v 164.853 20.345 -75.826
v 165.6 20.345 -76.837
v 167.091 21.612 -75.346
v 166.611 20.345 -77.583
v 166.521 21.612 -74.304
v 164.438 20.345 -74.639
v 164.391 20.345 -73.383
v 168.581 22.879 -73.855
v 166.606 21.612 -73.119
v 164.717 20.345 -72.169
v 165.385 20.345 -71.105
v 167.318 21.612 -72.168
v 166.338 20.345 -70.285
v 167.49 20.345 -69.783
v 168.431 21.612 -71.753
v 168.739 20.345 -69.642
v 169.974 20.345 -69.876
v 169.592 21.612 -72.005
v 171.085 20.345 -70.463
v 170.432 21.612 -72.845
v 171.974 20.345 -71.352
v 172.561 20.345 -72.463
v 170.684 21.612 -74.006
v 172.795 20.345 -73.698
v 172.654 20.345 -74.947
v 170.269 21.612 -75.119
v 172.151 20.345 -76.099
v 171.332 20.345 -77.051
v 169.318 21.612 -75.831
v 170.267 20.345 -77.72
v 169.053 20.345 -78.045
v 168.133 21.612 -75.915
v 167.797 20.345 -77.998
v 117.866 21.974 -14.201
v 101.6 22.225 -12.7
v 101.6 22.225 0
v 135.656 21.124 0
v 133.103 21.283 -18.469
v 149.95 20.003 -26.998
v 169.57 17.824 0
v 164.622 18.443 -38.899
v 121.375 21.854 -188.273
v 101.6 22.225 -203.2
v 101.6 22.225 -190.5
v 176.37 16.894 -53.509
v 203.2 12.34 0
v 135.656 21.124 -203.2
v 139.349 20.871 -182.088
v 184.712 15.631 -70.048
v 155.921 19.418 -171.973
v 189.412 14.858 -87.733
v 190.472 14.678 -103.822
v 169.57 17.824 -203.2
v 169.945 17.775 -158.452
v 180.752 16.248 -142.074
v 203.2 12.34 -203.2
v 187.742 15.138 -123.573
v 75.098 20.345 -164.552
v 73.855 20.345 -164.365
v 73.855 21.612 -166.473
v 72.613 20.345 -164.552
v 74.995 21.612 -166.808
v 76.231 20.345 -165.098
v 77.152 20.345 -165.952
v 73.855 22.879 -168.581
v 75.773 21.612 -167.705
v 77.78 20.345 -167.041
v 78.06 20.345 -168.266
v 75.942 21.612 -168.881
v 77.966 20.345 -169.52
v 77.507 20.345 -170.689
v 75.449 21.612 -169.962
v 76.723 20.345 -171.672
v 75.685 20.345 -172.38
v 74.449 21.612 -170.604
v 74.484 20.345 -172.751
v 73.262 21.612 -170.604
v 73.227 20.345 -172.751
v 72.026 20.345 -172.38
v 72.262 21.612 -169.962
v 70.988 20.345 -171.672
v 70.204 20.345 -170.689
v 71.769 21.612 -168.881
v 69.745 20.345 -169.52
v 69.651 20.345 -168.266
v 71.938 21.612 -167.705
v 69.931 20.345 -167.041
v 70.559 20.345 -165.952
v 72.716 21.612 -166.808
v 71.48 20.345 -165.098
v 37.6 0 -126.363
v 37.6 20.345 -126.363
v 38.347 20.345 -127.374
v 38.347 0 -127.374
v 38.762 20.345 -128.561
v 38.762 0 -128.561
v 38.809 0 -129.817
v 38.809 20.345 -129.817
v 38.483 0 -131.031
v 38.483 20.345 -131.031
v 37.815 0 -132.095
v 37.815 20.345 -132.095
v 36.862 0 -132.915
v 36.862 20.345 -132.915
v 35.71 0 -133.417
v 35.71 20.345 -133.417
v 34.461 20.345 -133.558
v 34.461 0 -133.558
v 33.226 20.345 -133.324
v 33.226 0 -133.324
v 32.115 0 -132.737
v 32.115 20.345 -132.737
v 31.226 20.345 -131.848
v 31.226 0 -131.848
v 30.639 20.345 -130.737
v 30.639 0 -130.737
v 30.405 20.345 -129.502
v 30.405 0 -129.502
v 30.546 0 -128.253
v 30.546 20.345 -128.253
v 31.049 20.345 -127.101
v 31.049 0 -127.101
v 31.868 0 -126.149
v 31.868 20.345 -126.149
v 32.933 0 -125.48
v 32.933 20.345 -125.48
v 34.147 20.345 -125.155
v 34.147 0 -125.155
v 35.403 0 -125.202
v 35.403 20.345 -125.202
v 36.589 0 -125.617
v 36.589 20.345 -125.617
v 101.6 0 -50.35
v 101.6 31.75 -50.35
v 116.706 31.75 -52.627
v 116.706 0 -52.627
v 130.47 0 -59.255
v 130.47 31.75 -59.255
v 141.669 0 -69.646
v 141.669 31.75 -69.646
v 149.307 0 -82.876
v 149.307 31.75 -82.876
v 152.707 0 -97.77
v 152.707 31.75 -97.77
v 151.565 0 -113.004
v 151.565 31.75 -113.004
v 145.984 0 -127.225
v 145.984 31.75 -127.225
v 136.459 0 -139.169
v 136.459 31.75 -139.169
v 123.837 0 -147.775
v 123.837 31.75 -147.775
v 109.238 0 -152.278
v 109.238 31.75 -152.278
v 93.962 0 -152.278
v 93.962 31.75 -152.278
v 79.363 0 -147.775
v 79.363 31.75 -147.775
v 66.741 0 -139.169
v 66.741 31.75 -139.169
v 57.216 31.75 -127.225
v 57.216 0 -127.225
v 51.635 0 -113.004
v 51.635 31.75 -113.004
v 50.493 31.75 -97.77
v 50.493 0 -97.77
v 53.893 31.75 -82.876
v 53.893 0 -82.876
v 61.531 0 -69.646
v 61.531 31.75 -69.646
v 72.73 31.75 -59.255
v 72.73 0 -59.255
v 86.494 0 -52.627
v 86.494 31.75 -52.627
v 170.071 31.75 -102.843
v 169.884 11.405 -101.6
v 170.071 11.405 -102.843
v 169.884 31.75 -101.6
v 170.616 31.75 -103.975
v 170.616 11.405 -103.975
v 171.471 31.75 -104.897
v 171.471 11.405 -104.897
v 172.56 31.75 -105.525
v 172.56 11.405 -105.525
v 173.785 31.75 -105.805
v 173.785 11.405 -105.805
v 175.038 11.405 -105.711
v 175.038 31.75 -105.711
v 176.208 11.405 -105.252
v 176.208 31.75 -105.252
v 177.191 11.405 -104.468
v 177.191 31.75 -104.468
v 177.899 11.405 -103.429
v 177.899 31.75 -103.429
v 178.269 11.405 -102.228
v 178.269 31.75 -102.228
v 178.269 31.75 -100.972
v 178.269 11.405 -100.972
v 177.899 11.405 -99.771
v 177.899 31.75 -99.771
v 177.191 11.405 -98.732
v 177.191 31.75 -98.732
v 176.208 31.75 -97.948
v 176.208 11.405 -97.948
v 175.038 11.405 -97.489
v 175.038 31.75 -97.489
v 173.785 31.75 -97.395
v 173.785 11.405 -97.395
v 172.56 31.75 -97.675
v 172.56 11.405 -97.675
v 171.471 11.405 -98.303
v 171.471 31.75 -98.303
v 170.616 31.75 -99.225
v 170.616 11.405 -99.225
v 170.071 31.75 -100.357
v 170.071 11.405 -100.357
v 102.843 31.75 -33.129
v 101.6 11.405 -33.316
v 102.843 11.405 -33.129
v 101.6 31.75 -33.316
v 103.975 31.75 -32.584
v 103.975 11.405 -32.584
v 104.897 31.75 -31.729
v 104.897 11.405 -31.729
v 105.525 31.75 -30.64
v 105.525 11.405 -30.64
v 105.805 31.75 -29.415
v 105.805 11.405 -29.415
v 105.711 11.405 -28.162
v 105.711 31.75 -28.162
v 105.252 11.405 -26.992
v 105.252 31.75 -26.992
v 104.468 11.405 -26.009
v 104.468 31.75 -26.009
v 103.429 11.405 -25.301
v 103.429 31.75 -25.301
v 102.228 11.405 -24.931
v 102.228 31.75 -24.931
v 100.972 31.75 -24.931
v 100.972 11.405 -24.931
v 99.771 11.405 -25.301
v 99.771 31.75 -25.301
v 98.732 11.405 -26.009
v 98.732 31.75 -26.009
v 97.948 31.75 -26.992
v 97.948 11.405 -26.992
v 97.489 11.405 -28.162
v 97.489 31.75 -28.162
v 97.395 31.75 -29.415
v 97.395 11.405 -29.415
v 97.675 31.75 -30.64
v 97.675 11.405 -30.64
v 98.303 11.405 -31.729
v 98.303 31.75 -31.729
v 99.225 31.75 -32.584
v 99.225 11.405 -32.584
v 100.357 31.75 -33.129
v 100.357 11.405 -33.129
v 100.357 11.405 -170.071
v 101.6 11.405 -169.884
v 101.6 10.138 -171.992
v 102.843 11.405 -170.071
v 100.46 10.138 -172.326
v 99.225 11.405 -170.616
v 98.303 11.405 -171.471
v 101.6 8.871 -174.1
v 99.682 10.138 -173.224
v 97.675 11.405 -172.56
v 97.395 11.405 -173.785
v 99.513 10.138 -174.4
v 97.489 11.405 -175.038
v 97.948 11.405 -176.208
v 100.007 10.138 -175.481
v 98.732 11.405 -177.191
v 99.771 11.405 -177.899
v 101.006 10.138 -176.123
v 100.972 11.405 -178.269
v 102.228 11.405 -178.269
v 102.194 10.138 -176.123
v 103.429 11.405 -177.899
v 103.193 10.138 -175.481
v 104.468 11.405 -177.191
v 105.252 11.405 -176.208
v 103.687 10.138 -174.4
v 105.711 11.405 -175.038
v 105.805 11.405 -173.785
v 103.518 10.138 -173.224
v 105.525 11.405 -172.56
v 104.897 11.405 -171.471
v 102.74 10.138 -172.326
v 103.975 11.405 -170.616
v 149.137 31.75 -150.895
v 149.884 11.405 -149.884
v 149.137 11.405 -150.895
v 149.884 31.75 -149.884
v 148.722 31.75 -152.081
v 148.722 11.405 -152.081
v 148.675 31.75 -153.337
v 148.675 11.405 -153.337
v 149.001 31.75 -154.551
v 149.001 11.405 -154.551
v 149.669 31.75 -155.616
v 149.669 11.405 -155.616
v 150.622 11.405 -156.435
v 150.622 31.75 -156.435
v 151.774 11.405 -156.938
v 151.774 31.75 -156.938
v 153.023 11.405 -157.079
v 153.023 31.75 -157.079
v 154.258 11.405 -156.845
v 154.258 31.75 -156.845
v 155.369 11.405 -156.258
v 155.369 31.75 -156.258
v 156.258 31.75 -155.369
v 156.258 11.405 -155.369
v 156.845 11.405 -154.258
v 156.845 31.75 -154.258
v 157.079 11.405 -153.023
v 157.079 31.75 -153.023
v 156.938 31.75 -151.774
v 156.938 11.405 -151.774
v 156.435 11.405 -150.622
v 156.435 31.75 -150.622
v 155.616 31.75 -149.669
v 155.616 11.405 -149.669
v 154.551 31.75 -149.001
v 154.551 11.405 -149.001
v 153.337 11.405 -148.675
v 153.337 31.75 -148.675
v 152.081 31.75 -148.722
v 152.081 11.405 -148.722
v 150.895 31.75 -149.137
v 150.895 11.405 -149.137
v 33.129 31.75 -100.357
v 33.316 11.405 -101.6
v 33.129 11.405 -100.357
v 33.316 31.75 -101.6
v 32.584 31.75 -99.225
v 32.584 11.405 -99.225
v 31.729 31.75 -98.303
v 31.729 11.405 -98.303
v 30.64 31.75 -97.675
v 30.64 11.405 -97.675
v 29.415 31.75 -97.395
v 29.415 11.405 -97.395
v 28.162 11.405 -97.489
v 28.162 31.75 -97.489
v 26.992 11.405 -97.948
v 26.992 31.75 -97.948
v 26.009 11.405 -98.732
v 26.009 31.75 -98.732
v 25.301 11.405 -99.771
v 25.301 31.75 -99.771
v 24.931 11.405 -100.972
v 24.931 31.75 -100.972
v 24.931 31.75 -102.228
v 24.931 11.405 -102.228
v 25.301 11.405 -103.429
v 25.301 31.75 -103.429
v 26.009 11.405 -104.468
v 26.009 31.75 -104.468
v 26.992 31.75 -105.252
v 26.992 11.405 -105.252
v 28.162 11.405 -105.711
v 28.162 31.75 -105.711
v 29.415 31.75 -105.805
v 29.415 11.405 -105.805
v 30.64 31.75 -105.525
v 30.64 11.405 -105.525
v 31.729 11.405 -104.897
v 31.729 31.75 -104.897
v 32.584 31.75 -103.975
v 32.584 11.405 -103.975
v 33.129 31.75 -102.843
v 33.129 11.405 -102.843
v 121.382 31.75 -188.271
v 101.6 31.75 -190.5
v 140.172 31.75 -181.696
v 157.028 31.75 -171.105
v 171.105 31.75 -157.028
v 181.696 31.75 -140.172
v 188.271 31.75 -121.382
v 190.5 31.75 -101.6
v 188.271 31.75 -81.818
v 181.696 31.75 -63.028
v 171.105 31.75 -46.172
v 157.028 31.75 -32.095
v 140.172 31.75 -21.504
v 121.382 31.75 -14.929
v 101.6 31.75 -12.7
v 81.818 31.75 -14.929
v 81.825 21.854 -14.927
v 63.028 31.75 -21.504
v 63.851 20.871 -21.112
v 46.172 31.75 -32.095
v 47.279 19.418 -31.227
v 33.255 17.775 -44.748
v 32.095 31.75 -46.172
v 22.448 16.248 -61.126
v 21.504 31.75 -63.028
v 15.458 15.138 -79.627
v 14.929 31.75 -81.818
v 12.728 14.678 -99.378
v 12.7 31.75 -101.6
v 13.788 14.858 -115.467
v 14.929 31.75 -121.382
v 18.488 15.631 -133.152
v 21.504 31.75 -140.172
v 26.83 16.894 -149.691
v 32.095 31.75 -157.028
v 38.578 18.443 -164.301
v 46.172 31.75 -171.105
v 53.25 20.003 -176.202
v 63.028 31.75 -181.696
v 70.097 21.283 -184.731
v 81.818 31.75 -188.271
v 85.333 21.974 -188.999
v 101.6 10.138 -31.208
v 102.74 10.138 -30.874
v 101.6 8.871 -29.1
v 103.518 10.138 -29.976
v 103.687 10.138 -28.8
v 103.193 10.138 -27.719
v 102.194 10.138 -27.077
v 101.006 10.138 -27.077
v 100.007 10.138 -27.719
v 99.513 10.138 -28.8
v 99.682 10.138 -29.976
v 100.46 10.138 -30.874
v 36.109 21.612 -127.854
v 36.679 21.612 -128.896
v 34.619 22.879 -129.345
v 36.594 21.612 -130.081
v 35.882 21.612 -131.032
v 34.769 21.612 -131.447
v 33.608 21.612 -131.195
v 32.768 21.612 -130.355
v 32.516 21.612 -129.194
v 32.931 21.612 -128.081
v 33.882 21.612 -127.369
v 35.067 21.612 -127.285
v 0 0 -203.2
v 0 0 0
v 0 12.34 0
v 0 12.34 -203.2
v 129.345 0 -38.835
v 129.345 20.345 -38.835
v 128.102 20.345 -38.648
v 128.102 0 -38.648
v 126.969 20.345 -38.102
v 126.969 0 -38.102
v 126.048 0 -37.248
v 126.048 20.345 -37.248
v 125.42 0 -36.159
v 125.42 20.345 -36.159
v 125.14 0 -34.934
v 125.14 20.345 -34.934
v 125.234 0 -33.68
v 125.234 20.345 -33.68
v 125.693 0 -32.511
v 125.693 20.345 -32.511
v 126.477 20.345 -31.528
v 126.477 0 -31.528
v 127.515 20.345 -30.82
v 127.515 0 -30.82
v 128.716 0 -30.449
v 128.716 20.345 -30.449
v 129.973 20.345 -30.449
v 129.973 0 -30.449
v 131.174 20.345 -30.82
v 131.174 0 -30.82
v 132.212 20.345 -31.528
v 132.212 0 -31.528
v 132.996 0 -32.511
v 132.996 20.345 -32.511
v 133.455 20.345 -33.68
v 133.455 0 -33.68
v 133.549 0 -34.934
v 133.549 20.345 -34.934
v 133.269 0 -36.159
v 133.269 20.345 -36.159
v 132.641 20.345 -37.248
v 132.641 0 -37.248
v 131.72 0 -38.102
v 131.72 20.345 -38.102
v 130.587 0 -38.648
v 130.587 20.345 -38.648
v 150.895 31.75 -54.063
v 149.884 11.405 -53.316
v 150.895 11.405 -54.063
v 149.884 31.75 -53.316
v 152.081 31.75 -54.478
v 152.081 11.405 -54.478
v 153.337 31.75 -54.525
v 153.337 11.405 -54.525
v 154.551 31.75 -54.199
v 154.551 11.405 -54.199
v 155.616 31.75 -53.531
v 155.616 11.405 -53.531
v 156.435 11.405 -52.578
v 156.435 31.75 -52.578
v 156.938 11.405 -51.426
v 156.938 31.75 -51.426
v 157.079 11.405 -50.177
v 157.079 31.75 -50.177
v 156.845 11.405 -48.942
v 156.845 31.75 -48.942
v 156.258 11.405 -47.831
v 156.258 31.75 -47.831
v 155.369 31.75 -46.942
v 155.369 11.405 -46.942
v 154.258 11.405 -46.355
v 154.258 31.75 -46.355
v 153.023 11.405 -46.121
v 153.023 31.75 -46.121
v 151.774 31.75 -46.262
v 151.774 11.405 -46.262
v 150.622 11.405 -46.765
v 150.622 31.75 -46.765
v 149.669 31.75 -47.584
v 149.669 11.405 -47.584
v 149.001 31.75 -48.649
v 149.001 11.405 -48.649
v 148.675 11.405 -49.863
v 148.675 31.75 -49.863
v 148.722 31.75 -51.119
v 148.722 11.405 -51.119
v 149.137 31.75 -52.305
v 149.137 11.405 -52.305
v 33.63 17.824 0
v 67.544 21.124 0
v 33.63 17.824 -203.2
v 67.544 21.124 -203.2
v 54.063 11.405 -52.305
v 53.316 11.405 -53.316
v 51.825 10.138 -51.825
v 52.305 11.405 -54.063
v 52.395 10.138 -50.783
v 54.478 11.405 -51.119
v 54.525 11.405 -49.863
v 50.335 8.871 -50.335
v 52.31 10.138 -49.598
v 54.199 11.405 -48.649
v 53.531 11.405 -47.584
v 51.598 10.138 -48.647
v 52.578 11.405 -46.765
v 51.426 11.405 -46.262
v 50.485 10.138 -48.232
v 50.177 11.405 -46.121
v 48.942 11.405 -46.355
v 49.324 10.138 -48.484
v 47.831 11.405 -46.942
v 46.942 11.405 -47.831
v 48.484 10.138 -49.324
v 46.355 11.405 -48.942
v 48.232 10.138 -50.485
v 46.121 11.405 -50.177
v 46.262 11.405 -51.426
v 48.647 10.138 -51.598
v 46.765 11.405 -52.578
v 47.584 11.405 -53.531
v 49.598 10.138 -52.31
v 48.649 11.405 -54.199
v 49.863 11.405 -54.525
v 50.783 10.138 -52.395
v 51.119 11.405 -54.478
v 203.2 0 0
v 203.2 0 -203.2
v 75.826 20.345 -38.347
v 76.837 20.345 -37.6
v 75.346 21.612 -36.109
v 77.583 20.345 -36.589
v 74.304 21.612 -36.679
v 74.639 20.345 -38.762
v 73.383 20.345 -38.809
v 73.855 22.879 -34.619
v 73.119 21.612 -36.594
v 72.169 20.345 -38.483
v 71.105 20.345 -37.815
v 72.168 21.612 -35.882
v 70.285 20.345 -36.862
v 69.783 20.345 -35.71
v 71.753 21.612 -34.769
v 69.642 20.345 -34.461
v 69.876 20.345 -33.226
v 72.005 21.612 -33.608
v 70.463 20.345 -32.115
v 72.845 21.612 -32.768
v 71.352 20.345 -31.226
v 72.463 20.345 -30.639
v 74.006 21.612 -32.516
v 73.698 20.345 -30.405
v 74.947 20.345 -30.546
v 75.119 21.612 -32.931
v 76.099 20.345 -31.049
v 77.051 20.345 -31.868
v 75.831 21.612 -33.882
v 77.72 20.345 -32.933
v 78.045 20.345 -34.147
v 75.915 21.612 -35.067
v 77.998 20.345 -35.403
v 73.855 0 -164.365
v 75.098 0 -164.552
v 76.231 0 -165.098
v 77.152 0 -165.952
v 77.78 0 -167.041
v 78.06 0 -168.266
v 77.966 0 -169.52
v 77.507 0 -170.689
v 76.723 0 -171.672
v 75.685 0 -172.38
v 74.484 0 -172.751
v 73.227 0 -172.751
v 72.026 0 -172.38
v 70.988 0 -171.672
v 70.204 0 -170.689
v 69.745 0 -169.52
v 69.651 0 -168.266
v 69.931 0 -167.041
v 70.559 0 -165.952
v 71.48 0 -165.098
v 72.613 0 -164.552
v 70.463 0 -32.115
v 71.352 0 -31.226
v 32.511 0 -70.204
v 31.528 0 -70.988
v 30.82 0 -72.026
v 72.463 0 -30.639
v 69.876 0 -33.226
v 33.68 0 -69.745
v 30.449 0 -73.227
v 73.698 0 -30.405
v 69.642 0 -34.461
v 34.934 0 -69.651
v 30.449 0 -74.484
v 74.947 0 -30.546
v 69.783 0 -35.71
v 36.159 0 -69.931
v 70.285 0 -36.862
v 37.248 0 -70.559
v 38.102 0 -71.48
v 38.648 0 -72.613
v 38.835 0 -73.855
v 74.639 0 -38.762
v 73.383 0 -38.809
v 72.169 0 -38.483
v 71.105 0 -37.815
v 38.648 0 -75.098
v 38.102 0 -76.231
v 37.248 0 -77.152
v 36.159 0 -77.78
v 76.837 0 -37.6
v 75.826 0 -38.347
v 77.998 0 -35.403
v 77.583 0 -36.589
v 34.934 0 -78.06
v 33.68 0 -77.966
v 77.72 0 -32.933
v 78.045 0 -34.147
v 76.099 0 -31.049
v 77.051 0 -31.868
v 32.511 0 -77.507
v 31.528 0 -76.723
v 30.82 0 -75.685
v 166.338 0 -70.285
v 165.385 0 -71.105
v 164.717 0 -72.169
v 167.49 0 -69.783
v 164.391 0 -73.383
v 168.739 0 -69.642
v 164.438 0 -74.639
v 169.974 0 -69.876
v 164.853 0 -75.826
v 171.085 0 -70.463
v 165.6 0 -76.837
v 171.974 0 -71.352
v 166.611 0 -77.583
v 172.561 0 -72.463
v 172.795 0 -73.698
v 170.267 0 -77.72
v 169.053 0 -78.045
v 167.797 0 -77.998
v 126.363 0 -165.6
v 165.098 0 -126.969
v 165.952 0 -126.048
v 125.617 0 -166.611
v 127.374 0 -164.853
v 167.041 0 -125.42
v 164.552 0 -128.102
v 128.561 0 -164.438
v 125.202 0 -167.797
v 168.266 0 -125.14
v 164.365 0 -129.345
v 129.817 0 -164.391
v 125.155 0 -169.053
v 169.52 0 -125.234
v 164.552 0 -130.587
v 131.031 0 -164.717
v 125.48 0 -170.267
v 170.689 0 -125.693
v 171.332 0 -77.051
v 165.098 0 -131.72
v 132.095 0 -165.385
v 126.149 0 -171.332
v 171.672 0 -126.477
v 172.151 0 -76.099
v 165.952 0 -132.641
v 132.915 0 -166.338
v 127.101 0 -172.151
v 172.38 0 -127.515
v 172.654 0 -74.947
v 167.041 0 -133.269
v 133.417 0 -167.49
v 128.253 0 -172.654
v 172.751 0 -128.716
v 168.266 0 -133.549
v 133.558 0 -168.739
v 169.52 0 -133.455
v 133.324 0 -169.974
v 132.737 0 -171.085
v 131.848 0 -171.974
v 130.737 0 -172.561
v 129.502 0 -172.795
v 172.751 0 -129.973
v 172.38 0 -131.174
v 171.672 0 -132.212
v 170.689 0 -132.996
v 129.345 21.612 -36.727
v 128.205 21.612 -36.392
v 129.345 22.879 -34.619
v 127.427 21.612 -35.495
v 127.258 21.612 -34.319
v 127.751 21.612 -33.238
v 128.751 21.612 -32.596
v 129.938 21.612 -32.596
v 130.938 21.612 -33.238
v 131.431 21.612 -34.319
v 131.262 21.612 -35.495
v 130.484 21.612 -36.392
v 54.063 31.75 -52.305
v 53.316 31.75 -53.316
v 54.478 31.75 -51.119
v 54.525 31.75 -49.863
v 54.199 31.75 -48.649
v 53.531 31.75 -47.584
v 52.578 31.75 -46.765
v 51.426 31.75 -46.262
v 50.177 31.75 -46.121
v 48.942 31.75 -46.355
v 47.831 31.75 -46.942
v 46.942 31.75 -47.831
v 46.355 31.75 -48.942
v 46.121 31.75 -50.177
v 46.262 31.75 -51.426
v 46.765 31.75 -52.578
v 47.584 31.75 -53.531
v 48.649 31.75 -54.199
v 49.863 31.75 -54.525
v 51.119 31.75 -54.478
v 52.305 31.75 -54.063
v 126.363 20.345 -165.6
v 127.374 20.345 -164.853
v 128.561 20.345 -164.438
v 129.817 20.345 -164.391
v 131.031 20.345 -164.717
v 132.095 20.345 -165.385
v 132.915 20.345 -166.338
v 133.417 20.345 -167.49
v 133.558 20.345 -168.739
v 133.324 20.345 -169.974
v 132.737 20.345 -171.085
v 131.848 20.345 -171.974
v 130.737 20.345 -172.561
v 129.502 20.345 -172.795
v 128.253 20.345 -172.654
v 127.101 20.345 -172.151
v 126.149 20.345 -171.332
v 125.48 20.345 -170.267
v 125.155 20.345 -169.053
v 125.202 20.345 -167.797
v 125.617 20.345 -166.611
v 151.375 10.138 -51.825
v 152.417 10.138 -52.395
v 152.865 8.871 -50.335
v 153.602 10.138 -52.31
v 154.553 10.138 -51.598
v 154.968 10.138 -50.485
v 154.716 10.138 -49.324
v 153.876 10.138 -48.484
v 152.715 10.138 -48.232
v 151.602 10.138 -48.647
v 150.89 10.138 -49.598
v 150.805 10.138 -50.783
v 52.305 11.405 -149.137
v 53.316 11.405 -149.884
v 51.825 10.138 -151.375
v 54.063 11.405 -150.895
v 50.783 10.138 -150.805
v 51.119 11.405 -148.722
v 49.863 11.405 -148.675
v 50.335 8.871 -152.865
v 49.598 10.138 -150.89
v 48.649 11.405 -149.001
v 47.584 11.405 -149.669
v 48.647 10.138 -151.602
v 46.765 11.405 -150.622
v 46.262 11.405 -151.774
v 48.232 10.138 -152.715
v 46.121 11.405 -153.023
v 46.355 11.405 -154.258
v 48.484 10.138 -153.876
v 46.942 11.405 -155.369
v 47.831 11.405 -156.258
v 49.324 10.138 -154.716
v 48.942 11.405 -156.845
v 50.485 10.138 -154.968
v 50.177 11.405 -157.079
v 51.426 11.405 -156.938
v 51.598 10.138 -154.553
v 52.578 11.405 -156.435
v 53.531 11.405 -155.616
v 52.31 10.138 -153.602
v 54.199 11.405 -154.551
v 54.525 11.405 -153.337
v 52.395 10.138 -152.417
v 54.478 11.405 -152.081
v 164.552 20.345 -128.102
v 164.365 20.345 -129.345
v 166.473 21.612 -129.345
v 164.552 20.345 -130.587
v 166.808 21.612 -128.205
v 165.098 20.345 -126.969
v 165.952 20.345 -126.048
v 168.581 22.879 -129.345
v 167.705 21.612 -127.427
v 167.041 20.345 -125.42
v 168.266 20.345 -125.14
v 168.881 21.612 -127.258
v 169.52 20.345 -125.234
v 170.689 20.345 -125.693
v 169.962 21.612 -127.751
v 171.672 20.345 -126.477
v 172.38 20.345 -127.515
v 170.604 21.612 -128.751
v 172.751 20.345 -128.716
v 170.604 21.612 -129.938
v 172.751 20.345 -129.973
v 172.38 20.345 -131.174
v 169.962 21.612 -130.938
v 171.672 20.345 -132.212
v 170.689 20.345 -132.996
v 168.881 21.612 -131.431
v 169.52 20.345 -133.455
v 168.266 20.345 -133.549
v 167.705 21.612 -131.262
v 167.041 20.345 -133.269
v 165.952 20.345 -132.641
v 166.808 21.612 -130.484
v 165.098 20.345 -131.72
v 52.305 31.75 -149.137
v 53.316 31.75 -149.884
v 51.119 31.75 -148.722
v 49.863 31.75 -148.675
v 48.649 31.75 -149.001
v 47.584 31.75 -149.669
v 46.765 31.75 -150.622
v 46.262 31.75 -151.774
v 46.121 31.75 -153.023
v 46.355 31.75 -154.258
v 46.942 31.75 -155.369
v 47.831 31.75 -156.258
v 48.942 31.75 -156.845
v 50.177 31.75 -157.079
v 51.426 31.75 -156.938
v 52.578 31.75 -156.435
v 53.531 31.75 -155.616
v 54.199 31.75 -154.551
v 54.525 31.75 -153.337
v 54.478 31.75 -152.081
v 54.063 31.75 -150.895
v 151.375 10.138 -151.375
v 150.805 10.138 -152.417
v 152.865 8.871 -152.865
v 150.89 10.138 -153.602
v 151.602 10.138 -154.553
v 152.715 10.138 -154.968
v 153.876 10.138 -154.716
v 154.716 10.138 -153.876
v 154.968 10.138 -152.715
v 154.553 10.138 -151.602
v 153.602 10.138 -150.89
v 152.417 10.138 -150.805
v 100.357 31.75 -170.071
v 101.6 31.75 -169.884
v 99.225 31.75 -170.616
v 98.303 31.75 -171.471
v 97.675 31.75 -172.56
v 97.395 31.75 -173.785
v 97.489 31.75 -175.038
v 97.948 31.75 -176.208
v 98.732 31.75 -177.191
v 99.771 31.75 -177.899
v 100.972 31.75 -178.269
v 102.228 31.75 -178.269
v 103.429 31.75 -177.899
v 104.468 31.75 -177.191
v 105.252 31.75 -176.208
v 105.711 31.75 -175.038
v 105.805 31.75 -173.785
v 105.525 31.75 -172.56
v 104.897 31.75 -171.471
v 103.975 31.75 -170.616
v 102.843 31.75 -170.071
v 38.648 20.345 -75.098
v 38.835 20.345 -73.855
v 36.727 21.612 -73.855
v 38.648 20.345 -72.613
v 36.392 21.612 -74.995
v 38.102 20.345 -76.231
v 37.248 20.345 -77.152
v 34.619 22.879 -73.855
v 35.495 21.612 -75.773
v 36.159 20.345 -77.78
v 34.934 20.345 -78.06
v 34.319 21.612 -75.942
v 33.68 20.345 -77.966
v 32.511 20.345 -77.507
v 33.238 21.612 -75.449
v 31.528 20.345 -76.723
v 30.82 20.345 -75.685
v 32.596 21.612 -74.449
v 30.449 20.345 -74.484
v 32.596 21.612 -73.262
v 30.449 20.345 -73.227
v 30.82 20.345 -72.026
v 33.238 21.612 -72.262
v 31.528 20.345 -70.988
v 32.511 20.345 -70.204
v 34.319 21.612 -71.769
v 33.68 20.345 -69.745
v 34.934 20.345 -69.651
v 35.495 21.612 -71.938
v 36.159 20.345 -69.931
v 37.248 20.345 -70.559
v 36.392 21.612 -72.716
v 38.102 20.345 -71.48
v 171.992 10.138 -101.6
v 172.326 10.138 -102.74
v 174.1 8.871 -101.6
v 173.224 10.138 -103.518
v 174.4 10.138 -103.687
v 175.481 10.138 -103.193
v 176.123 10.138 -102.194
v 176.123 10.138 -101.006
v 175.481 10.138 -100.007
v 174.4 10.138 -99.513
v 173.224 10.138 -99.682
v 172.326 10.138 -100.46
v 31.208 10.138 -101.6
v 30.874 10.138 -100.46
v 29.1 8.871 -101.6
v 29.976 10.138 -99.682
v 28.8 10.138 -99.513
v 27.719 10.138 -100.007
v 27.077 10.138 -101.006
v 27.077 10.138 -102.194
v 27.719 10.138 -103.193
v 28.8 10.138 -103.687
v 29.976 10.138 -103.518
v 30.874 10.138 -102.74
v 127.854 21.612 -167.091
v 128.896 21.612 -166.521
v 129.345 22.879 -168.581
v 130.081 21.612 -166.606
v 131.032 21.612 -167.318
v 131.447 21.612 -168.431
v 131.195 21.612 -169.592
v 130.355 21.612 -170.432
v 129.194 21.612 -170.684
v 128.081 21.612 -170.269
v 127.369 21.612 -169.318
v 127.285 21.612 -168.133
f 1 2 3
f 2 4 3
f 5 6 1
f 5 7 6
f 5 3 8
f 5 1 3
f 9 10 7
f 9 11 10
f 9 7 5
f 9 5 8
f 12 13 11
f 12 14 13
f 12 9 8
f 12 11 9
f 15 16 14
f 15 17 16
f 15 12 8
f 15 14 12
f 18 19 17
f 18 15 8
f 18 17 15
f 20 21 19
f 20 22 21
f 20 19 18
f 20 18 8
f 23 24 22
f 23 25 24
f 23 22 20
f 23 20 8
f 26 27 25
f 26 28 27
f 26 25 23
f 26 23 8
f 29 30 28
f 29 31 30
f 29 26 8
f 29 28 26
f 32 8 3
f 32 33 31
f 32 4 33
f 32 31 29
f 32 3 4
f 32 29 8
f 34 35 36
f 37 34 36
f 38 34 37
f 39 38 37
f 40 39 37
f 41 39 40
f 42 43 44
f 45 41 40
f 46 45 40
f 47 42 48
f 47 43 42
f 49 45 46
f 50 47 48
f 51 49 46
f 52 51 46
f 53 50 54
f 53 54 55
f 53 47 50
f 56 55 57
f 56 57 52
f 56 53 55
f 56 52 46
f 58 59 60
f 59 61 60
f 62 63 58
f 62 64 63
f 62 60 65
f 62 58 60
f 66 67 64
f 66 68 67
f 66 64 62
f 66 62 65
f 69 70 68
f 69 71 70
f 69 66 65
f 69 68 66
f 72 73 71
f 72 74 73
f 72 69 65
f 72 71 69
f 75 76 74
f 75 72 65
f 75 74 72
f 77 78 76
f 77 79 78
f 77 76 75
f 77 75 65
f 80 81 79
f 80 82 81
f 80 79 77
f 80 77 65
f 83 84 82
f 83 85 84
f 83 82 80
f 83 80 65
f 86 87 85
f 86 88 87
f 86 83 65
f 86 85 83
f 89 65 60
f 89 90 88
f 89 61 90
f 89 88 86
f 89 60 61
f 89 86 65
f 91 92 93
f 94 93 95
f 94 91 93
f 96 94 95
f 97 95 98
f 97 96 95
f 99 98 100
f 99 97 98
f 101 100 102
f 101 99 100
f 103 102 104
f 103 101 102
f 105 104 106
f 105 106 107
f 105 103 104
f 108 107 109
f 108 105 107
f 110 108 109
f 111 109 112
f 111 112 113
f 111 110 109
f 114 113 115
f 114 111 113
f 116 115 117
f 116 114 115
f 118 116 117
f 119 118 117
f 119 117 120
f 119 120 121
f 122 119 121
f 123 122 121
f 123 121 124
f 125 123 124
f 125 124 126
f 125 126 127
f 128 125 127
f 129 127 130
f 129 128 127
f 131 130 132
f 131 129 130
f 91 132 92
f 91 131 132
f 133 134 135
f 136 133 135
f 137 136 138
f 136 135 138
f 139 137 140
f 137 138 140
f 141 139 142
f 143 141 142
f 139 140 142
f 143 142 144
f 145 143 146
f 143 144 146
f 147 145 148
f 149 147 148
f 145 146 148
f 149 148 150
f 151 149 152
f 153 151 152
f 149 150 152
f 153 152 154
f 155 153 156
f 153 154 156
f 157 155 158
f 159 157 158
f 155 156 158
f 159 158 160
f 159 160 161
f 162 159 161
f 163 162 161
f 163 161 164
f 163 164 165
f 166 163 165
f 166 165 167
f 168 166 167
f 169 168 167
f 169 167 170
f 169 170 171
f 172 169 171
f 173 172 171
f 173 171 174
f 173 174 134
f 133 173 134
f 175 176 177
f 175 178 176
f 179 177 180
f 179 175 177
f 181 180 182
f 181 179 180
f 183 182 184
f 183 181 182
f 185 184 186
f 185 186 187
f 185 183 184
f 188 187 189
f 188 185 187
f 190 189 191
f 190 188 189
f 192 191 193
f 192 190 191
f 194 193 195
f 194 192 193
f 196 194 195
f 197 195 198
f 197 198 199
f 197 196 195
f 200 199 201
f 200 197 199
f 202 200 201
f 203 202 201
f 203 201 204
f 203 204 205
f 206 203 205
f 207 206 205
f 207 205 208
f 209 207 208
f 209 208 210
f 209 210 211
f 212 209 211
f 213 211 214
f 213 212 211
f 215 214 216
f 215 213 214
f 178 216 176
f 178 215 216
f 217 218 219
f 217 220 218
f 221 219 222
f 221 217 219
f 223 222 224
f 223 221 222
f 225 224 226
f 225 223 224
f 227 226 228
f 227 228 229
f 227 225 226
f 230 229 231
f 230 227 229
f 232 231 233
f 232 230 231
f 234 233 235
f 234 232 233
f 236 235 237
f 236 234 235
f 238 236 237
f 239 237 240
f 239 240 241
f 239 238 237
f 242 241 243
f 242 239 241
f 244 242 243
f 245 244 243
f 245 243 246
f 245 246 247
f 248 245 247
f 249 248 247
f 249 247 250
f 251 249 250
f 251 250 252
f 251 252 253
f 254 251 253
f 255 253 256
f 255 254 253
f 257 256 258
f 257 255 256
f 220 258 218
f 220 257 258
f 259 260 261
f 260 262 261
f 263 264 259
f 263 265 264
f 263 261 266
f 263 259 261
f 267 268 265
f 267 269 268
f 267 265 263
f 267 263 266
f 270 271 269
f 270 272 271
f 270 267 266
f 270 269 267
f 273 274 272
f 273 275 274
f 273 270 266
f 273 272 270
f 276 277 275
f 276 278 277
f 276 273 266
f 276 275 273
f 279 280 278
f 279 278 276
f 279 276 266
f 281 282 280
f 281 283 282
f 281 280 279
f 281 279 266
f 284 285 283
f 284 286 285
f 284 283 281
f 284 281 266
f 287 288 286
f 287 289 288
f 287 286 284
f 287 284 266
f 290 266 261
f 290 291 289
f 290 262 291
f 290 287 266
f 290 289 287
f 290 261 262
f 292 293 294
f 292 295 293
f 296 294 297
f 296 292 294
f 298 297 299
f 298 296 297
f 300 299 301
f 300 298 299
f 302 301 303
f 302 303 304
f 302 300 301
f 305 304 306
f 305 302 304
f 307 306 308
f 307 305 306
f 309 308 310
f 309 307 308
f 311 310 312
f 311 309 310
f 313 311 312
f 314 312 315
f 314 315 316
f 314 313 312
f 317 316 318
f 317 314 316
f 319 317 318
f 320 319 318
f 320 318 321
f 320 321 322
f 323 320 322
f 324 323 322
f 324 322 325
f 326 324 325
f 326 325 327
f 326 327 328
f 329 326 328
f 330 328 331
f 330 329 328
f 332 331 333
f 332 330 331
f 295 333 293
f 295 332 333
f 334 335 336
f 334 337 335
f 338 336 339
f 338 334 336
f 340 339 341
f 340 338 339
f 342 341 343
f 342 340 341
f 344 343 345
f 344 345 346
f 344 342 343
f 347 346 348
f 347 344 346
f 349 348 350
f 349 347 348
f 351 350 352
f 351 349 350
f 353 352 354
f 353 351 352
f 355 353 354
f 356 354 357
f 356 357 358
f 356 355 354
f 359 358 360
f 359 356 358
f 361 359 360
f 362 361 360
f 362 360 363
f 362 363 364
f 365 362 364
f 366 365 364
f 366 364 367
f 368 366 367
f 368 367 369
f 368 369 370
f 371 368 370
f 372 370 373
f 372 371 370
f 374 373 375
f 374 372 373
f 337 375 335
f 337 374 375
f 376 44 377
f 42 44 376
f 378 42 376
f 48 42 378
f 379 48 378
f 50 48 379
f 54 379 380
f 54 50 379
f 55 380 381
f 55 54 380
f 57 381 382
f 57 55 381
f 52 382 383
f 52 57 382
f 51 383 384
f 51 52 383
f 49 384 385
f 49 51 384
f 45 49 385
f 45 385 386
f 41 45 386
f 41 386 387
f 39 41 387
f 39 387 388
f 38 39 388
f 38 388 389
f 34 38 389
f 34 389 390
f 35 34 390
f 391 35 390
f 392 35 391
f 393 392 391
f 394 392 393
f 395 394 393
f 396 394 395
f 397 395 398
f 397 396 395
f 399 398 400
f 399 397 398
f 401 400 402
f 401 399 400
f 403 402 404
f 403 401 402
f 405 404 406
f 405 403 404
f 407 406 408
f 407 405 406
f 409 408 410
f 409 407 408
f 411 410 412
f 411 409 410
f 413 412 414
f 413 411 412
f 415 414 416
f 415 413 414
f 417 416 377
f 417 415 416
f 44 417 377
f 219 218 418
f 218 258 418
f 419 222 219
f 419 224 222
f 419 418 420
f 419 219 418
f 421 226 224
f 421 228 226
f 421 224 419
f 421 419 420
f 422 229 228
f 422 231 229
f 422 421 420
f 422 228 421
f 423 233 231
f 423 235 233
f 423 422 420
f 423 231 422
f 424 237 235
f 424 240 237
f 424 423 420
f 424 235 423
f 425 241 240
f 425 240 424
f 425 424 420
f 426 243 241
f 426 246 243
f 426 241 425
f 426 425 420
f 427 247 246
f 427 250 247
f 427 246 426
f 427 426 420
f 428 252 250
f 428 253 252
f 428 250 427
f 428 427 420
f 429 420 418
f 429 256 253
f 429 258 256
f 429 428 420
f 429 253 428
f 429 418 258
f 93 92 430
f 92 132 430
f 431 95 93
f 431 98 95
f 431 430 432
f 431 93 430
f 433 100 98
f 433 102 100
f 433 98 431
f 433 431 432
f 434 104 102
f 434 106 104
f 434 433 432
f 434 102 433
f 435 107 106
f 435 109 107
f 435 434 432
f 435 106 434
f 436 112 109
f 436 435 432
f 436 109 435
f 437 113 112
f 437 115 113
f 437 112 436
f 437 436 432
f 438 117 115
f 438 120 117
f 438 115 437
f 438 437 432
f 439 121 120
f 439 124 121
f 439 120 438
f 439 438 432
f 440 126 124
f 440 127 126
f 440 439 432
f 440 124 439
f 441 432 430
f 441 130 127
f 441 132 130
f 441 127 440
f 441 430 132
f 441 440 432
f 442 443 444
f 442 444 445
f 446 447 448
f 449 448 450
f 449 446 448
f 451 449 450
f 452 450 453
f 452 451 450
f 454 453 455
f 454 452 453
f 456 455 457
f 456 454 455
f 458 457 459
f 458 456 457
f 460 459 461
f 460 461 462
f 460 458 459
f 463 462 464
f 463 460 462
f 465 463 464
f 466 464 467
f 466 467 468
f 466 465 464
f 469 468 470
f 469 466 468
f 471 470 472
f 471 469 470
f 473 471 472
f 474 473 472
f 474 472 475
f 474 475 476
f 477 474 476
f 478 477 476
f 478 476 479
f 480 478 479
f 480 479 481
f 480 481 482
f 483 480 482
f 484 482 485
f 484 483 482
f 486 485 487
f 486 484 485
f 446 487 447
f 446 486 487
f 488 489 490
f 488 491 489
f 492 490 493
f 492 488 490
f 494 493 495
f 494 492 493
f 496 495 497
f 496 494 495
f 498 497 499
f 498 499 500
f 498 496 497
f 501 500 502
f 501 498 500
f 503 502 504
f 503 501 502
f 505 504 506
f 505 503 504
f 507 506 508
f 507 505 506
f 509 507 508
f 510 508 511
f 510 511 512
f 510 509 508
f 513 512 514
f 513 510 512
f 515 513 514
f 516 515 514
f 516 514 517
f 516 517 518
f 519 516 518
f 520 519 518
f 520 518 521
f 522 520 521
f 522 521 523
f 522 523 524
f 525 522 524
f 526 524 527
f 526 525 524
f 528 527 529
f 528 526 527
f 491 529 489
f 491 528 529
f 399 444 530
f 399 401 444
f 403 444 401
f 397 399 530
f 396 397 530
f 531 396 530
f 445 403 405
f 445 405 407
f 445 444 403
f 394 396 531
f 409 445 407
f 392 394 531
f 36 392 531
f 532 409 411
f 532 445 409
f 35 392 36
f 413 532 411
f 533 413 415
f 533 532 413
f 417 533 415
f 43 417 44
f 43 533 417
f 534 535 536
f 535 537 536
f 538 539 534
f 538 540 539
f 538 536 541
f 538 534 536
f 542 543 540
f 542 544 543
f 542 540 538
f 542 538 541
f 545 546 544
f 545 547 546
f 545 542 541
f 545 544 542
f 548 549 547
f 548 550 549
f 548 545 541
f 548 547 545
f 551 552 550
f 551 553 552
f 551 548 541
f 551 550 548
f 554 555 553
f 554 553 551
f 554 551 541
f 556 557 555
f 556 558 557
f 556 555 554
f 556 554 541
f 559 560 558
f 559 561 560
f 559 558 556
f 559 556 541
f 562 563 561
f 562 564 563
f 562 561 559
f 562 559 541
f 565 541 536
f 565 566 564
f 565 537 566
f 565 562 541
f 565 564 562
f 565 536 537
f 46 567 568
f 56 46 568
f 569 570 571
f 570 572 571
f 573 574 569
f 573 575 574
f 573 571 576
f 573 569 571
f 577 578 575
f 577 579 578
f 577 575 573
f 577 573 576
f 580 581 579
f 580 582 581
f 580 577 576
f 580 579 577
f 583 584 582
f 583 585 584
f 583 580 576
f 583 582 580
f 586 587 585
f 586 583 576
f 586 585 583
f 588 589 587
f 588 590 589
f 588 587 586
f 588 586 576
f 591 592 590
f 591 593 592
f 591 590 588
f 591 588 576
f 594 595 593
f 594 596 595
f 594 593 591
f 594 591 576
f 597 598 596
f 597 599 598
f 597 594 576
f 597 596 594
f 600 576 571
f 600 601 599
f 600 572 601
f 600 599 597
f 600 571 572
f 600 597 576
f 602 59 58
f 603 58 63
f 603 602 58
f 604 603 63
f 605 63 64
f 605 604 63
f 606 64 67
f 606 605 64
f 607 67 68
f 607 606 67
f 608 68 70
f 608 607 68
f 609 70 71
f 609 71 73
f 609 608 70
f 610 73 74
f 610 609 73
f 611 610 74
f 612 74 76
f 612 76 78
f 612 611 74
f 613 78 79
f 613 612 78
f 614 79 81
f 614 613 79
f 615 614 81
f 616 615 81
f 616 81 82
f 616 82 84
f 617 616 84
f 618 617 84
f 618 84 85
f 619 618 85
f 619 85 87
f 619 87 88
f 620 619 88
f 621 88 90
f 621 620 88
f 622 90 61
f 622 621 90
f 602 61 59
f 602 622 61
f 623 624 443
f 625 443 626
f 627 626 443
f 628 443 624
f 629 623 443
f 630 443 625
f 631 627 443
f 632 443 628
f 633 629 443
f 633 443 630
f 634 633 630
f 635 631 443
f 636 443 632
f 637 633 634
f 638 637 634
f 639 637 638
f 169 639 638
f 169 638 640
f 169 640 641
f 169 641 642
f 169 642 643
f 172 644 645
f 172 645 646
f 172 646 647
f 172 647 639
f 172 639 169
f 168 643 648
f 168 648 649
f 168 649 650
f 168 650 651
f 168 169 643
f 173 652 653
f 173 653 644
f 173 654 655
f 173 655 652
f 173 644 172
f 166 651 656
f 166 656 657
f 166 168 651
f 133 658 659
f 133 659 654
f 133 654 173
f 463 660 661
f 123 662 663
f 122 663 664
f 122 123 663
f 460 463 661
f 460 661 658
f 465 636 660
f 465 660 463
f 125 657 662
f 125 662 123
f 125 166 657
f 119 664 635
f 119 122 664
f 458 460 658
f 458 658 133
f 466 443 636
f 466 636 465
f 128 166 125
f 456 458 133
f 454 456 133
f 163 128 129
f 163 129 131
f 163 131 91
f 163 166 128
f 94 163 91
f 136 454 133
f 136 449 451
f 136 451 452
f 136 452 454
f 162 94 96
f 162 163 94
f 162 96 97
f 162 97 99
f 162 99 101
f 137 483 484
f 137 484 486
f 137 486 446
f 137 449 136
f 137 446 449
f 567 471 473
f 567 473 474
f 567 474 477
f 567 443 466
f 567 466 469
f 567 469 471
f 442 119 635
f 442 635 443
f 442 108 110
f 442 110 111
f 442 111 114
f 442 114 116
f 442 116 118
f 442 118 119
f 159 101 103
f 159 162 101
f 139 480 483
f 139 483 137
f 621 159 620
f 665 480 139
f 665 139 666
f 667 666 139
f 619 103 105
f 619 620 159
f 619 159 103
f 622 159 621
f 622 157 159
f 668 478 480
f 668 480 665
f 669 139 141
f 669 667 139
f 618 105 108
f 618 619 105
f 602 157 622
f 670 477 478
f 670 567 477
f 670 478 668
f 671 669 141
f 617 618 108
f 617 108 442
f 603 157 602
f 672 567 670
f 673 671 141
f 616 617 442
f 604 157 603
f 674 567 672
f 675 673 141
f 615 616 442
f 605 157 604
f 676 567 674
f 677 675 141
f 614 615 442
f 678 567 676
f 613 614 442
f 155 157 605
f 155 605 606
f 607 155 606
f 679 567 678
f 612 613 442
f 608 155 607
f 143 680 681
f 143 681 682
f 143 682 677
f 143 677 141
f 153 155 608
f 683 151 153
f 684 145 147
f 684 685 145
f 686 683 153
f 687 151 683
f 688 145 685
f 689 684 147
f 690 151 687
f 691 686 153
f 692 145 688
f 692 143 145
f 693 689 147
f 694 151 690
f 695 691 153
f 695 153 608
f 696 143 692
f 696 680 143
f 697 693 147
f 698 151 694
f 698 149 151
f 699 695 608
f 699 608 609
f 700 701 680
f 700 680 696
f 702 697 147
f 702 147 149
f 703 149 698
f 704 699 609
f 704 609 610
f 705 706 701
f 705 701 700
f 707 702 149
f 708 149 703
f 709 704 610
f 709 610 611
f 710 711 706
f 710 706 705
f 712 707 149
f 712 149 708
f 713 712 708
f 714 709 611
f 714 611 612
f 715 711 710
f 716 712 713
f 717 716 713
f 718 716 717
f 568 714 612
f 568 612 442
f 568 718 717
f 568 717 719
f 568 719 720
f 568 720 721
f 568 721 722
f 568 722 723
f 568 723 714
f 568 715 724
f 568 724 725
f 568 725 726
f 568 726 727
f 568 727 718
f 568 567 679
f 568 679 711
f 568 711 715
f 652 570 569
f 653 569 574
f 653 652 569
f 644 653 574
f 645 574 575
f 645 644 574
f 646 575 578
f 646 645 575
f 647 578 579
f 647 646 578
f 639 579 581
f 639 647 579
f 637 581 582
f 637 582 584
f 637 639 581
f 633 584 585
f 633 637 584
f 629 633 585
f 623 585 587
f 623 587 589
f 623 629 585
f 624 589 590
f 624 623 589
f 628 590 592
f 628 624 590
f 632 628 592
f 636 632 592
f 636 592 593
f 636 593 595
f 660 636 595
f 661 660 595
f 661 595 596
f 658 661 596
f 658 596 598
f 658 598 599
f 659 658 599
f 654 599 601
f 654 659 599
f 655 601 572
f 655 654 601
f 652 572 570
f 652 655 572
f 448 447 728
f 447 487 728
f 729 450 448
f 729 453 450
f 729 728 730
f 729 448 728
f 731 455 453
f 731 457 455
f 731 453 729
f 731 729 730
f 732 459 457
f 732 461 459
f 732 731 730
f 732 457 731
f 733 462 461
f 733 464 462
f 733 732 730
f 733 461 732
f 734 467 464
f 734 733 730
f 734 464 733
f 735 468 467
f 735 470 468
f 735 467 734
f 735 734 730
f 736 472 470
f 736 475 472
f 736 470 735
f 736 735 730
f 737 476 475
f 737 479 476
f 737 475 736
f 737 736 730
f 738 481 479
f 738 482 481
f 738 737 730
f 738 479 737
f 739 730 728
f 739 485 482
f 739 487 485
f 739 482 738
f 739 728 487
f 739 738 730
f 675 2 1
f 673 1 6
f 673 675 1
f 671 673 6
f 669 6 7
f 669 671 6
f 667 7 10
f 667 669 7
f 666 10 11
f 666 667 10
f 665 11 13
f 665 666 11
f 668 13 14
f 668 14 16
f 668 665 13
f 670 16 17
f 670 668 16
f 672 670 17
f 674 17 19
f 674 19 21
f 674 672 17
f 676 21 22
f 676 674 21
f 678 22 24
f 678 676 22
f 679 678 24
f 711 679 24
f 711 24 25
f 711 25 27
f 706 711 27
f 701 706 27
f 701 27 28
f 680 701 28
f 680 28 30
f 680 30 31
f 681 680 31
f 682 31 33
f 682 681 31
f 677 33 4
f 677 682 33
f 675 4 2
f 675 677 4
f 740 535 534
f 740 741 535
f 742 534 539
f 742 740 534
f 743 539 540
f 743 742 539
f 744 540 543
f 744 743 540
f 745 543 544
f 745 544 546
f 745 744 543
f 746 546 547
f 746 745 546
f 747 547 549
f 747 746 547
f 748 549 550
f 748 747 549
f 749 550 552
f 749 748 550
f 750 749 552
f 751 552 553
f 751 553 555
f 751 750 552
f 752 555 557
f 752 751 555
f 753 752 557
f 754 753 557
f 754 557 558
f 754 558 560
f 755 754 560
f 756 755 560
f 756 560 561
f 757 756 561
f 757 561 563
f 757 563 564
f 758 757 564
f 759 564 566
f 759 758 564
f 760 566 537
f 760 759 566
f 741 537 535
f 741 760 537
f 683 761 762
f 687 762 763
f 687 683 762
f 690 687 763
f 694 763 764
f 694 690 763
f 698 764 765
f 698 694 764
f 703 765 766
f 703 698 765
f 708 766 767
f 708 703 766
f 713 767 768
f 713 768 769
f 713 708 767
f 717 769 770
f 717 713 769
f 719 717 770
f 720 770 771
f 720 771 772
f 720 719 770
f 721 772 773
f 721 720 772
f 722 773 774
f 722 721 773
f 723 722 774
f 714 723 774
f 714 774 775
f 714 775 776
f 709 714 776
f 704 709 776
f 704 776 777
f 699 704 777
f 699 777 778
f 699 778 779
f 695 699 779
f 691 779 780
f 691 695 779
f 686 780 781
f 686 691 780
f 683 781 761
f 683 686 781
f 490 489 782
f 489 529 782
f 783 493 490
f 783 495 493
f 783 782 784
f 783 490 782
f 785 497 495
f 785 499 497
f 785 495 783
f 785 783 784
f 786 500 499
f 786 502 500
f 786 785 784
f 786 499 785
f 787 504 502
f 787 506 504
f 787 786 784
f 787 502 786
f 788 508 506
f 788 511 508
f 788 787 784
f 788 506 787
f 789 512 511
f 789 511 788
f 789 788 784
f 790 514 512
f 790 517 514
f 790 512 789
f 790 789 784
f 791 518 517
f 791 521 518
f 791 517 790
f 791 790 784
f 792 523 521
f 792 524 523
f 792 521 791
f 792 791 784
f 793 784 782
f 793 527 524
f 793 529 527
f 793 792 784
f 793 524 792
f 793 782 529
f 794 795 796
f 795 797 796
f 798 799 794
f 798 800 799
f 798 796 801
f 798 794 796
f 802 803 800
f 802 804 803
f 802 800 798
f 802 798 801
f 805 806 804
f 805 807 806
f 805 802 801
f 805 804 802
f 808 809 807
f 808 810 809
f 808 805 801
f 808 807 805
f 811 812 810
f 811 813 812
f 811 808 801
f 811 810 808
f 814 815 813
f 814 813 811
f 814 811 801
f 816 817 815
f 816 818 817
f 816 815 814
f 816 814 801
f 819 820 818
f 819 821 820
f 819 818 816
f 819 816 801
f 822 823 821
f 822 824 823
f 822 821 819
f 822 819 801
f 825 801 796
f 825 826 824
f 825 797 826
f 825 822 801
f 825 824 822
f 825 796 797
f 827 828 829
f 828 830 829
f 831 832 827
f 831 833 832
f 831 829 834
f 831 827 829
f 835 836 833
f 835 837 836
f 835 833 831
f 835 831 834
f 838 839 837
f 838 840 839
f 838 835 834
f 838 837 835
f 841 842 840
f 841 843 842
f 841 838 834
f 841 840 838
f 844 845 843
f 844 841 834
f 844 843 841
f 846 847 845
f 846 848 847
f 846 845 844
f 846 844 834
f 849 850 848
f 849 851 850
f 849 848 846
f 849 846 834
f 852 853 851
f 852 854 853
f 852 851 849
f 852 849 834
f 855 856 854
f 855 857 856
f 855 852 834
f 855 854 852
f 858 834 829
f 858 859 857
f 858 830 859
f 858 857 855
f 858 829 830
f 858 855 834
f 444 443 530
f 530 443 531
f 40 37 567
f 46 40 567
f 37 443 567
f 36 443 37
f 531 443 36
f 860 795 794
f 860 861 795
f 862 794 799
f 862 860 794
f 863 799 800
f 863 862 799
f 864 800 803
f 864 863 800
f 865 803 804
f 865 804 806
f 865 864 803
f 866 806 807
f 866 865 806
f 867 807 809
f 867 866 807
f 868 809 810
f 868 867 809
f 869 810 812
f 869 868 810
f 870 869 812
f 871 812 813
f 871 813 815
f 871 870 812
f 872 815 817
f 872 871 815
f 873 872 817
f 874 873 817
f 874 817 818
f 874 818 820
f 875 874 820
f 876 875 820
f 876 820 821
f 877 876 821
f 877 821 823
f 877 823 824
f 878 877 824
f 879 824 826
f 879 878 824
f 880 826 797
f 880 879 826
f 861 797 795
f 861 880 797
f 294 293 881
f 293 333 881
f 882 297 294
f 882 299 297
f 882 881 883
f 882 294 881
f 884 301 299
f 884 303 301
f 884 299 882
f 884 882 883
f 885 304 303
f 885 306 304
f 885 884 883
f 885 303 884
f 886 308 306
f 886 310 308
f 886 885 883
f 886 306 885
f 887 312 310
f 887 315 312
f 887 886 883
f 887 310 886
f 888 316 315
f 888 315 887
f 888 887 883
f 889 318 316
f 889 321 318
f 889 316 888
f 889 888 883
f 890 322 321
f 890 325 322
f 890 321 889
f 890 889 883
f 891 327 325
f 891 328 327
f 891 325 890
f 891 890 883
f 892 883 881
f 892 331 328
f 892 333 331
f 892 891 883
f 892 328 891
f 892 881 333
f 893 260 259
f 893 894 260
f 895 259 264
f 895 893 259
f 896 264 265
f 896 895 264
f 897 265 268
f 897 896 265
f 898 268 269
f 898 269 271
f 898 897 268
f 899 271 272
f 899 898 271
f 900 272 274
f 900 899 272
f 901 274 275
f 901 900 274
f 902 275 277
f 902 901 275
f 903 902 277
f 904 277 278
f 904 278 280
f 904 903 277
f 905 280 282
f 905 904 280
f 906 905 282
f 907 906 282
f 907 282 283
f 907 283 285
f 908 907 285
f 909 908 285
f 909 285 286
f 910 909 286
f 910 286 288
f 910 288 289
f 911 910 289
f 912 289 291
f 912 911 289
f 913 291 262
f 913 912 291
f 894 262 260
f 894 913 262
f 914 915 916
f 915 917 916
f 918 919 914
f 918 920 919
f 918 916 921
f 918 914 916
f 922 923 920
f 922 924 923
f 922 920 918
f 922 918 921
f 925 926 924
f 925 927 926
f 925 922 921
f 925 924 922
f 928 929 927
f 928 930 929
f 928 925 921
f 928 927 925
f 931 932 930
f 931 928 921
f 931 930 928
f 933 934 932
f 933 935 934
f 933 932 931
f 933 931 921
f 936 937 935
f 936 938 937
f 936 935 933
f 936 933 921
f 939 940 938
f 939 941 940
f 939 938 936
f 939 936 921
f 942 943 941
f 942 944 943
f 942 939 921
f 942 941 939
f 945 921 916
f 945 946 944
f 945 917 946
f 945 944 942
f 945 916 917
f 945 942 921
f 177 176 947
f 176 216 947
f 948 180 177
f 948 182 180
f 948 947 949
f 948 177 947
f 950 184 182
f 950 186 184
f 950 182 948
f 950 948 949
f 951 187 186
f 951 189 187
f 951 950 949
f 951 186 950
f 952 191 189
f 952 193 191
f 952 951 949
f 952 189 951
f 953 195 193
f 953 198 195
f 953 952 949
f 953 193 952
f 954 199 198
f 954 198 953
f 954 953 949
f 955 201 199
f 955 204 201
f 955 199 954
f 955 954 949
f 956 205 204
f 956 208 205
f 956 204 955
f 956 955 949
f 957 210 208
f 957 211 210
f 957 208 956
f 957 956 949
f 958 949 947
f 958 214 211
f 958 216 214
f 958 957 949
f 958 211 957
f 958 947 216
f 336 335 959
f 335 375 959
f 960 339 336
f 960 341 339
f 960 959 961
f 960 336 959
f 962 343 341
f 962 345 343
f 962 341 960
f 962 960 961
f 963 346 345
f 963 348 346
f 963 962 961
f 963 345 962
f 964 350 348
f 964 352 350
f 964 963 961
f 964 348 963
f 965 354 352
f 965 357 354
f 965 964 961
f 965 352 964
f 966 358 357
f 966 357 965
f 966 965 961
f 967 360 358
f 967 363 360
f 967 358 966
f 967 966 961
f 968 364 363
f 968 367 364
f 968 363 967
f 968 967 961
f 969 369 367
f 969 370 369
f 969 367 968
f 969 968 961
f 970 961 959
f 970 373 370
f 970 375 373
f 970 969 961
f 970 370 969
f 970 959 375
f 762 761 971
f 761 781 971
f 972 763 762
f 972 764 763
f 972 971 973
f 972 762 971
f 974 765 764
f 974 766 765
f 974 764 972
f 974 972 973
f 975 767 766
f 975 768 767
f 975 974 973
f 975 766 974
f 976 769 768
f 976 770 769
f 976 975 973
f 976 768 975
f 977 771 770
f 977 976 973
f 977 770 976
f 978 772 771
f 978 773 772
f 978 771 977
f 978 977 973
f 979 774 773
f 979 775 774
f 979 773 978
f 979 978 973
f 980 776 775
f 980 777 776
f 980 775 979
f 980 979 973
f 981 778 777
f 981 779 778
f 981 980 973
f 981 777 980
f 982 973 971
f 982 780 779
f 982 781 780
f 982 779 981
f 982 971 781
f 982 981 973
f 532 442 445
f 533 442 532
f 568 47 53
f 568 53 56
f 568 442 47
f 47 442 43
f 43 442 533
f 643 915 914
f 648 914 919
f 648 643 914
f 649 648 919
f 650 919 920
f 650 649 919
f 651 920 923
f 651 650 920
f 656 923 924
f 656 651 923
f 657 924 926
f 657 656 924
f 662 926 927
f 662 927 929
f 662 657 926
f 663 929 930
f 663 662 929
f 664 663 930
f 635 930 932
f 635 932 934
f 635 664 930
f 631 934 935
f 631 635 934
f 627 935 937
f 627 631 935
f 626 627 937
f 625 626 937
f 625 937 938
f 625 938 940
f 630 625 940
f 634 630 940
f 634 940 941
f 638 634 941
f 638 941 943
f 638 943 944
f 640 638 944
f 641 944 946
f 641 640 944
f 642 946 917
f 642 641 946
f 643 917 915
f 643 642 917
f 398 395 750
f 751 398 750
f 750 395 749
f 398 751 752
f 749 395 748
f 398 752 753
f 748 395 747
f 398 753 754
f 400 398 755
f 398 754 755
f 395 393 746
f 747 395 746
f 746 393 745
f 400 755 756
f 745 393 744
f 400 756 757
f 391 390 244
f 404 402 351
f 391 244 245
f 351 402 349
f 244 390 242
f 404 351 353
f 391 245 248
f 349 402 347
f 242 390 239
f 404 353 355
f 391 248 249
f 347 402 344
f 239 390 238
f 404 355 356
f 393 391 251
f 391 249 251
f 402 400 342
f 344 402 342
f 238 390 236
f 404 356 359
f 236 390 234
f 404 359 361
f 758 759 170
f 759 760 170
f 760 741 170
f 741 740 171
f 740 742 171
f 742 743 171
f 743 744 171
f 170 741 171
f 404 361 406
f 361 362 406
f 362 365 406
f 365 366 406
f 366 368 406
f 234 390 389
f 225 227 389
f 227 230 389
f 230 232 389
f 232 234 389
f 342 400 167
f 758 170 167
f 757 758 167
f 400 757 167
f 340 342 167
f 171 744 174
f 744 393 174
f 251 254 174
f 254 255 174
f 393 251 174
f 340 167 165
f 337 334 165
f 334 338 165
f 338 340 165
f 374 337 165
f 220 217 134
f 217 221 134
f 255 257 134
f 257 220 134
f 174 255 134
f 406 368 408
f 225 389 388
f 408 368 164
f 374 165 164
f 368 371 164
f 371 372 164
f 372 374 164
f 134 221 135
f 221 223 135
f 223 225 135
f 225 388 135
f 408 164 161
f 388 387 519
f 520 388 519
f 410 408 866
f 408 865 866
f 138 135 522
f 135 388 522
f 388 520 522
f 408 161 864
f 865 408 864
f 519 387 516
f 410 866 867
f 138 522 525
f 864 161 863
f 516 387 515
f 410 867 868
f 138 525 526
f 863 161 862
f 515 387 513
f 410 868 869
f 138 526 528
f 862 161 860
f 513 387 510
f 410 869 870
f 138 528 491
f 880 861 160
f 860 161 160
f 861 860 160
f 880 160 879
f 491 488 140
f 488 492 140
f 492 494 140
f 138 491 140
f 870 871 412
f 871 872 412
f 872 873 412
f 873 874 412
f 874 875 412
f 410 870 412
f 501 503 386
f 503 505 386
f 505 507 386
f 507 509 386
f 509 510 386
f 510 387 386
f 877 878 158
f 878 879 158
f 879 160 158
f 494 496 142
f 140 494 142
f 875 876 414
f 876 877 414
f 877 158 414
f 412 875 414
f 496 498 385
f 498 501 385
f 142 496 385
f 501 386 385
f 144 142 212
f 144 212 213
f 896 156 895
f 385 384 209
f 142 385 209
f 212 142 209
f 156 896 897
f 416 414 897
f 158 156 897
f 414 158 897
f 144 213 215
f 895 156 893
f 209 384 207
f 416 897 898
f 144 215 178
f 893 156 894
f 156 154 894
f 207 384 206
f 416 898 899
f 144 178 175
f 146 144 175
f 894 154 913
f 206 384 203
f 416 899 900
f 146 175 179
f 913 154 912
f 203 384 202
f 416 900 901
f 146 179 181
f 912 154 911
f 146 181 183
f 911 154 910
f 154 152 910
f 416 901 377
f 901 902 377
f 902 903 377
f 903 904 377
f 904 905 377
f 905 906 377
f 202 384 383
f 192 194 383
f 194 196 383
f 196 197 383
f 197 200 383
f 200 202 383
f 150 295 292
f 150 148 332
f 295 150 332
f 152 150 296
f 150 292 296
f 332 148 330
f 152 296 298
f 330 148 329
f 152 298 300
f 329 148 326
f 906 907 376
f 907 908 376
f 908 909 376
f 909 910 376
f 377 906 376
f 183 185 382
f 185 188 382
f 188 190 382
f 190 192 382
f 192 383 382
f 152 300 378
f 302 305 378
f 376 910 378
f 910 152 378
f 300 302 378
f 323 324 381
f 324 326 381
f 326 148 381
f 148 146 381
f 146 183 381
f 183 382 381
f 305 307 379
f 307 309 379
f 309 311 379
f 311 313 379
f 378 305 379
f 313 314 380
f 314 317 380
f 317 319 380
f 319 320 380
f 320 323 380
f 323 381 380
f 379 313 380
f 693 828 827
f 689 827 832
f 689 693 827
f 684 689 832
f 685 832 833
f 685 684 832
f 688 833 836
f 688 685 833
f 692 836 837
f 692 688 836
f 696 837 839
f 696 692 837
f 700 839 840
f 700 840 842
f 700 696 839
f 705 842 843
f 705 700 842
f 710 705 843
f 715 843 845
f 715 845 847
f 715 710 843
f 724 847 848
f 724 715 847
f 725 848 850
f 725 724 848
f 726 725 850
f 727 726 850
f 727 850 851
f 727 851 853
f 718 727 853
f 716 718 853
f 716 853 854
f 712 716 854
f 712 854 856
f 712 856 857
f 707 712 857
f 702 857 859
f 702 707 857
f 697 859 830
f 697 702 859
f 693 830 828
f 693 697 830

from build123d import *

# Parameters (mm, degrees)
SKETCH1_W           = 203.2
SKETCH1_H           = 203.2
BOSS_EXTRUDE1_DEPTH = 22.225
CUT_EXTRUDE1_START  = -203.2
CUT_EXTRUDE1_DEPTH  = 203.2
SKETCH3_R           = 88.9
BOSS_EXTRUDE2_DEPTH = 31.75
SKETCH4_R           = 51.25
CUT_EXTRUDE2_DEPTH  = 290.116832062
CIRPATTERN1_COUNT   = 8
CIRPATTERN2_COUNT   = 8


# Read off the part's stored shape, not the designer's step: Cut-Extrude1
with BuildPart() as part:
    # Sketch1 → Boss-Extrude1 (new body)
    with BuildSketch(Plane(origin=(0, 0, 0), x_dir=(1, 0, 0), z_dir=(0, 1, 0))):
        with Locations((101.6, 101.6)):
            Rectangle(SKETCH1_W, SKETCH1_H)
    extrude(amount=BOSS_EXTRUDE1_DEPTH)

    # Cut-Extrude1 outline → Cut-Extrude1 (cut)
    with BuildSketch(Plane.XY.offset(CUT_EXTRUDE1_START)):
        with BuildLine():
            ThreePointArc((0, 12.339521695), (50.560108139, 19.747808997), (101.600002148, 22.225))
            Line((101.600002148, 22.225), (0, 22.225))
            Line((0, 22.225), (0, 12.339521695))
        make_face()
        with BuildLine():
            ThreePointArc((101.600002148, 22.225), (152.639893999, 19.747808789), (203.2, 12.339521695))
            Line((203.2, 12.339521695), (203.2, 22.225))
            Line((203.2, 22.225), (101.600002148, 22.225))
        make_face()
    extrude(amount=CUT_EXTRUDE1_DEPTH, mode=Mode.SUBTRACT)

    # Sketch3 → Boss-Extrude2 (add)
    with BuildSketch(Plane(origin=(0, 0, 0), x_dir=(-1, 0, 0), z_dir=(0, -1, 0))):
        with Locations(Location((-101.6, 101.6, 0), (0, 0, 90))):
            Circle(SKETCH3_R)
    extrude(amount=-BOSS_EXTRUDE2_DEPTH)

    # Sketch4 → Cut-Extrude2 (cut, through all)
    with BuildSketch(Plane(origin=(0, 31.75, 0), x_dir=(1, 0, 0), z_dir=(0, 1, 0))):
        with Locations(Location((101.6, 101.6, 0), (0, 0, 270))):
            Circle(SKETCH4_R)
    extrude(amount=-CUT_EXTRUDE2_DEPTH, mode=Mode.SUBTRACT)

    # Sketch6 → Tapped Hole for 5/16-18 Helicoil1 (revolve, cut)
    with BuildSketch(Plane(origin=(101.6, 31.75, -174.1), x_dir=(0, 0, 1), z_dir=(1, 0, 0))):
        Polygon((0, 0), (0, 22.878868714), (4.2164, 20.3454), (4.2164, 0), align=None)
    tapped_hole_for_5_16_18_helicoil1 = revolve(axis=Axis((101.6, 38.1, -174.1), (0, -1, 0)), mode=Mode.SUBTRACT)

    # CirPattern1: Tapped Hole for 5/16-18 Helicoil1 ×8 about axis
    cirpattern1_axis = Axis((101.6, 0, -101.6), (0, 1, 0))
    for i in range(1, CIRPATTERN1_COUNT):
        add(tapped_hole_for_5_16_18_helicoil1.rotate(cirpattern1_axis, i * 360 / CIRPATTERN1_COUNT), mode=Mode.SUBTRACT)

    # Sketch13 → Tapped Hole for 5/16-18 Helicoil2 (revolve, cut)
    with BuildSketch(Plane(origin=(129.344548846, 0, -34.618733893), x_dir=(0, 0, -1), z_dir=(1, 0, 0))):
        Polygon((0, 0), (0, 22.878868714), (4.2164, 20.3454), (4.2164, 0), align=None)
    tapped_hole_for_5_16_18_helicoil2 = revolve(axis=Axis((129.344548846, -6.35, -34.618733893), (0, 1, 0)), mode=Mode.SUBTRACT)

    # CirPattern2: Tapped Hole for 5/16-18 Helicoil2 ×8 about axis
    cirpattern2_axis = Axis((101.6, 0, -101.6), (0, 1, 0))
    for i in range(1, CIRPATTERN2_COUNT):
        add(tapped_hole_for_5_16_18_helicoil2.rotate(cirpattern2_axis, i * 360 / CIRPATTERN2_COUNT), mode=Mode.SUBTRACT)


solid = part.part
